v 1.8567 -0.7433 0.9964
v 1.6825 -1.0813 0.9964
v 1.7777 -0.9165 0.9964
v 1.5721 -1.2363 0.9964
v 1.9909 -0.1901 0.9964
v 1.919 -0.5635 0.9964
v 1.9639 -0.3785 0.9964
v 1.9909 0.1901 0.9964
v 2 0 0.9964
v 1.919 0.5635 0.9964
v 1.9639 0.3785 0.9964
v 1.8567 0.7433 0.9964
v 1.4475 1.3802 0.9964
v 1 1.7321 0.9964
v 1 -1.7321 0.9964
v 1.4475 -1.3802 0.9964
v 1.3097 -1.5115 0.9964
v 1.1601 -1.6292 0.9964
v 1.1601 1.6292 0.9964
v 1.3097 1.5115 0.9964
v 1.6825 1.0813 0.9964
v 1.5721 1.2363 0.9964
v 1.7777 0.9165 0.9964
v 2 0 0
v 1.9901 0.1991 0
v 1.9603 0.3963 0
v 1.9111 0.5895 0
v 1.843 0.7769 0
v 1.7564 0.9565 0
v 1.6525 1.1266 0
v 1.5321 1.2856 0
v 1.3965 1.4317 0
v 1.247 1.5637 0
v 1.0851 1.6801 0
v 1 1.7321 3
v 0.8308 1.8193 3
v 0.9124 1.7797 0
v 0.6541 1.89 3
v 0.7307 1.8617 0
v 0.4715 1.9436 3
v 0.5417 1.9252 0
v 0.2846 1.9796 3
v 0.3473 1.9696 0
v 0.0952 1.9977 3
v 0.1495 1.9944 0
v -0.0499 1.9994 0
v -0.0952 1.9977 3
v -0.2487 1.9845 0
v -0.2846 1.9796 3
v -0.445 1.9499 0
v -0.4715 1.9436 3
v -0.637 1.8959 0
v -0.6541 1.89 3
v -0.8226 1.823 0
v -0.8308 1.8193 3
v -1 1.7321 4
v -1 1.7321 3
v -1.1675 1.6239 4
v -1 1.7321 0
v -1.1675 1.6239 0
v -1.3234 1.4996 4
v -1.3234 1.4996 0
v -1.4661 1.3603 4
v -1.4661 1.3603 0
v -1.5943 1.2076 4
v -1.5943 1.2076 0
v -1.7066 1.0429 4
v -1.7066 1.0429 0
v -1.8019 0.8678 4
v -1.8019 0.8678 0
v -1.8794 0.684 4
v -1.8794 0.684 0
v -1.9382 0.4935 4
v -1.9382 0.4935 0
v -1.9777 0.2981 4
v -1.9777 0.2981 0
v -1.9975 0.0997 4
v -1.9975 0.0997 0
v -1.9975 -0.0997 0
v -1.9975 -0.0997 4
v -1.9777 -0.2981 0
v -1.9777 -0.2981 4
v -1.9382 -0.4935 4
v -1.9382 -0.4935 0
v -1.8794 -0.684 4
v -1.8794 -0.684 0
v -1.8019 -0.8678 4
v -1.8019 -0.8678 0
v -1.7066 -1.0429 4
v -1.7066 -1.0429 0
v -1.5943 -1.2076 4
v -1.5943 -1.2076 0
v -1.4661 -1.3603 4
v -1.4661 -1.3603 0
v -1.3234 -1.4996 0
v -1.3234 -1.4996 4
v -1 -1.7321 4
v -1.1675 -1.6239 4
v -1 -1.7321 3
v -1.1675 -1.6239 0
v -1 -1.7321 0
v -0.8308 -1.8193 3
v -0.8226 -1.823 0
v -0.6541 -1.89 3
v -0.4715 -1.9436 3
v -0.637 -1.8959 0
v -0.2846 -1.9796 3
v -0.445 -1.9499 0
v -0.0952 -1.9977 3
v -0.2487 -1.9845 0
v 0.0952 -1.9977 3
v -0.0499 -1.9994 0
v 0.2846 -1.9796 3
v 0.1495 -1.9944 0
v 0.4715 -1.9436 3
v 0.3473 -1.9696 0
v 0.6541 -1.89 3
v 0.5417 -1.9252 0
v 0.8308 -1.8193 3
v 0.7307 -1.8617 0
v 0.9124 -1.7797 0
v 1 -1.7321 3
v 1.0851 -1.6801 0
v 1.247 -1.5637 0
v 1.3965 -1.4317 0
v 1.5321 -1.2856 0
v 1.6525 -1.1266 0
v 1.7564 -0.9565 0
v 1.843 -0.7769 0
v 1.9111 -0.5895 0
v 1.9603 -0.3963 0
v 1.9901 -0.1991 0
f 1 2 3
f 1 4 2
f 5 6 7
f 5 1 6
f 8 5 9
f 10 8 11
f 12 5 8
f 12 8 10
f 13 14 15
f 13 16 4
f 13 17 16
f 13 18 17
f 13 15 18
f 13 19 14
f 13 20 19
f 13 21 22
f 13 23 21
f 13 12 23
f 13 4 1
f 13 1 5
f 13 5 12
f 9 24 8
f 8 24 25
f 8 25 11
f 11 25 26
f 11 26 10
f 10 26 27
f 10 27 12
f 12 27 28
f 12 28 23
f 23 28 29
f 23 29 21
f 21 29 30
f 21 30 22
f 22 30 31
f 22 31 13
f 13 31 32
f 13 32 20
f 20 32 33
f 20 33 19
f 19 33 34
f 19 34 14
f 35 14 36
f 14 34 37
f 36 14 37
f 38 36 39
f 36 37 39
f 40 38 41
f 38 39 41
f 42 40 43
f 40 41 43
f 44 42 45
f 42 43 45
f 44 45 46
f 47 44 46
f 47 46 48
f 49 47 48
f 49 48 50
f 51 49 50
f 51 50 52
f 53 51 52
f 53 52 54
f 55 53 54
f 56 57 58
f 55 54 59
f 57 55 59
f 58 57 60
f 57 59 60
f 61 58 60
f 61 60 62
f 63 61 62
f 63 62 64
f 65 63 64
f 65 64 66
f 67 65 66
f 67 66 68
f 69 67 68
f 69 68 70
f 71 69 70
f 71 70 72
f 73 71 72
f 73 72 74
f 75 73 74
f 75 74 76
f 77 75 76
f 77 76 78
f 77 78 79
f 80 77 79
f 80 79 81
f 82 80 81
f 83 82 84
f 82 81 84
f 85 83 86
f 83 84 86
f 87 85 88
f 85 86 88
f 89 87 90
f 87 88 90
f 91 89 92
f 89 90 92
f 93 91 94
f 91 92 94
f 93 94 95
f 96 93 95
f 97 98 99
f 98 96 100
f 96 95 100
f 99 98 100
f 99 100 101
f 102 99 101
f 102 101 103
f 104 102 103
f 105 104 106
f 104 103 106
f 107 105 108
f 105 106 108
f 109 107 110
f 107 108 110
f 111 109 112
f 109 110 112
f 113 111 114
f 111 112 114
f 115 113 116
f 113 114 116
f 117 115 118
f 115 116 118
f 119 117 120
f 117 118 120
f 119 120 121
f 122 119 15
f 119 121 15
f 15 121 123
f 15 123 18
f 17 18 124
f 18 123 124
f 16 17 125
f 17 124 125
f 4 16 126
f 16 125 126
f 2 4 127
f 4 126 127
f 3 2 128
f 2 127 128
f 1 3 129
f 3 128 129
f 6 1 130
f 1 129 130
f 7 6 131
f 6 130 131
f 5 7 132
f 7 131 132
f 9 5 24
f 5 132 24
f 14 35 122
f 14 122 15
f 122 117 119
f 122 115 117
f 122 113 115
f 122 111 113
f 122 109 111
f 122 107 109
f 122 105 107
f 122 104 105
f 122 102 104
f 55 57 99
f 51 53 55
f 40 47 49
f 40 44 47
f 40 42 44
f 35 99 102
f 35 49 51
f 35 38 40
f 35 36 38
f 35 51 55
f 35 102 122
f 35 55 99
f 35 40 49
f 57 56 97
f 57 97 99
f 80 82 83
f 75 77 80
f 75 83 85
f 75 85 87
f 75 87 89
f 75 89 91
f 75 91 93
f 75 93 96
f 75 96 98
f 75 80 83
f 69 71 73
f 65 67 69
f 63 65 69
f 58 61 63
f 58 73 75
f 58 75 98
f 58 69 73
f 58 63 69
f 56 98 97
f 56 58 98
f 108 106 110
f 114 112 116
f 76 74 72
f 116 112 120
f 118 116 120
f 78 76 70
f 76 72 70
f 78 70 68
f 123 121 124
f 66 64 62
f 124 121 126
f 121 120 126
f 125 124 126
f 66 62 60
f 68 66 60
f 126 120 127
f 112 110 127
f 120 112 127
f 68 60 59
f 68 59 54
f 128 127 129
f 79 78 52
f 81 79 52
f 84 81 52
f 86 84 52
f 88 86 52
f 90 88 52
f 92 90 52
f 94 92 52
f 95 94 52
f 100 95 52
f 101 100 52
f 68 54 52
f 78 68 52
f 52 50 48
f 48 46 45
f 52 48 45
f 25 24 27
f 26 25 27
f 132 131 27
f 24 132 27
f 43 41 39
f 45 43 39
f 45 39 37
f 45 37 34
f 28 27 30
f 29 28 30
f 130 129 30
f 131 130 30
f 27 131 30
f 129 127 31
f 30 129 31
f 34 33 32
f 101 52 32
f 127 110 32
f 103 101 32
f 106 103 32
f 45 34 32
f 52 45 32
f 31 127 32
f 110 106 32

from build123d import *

# Parameters (mm, degrees)
SKETCH1_R           = 2
BOSS_EXTRUDE1_DEPTH = 4
CUT_EXTRUDE2_DEPTH  = 2


with BuildPart() as part:
    # Sketch1 → Boss-Extrude1 (new body)
    with BuildSketch(Plane.XY):
        Circle(SKETCH1_R)
    extrude(amount=BOSS_EXTRUDE1_DEPTH)

    # Sketch2 → Cut-Extrude2 (cut, symmetric)
    with BuildSketch(Plane(origin=(0, 0, 0), x_dir=(1, 0, 0), z_dir=(0, 1, 0))):
        Polygon((-1, -3), (1, -3), (1, -0.996424707), (2, -0.996424707), (2, -4), (-1, -4), align=None)
    extrude(amount=CUT_EXTRUDE2_DEPTH, both=True, mode=Mode.SUBTRACT)


solid = part.part
